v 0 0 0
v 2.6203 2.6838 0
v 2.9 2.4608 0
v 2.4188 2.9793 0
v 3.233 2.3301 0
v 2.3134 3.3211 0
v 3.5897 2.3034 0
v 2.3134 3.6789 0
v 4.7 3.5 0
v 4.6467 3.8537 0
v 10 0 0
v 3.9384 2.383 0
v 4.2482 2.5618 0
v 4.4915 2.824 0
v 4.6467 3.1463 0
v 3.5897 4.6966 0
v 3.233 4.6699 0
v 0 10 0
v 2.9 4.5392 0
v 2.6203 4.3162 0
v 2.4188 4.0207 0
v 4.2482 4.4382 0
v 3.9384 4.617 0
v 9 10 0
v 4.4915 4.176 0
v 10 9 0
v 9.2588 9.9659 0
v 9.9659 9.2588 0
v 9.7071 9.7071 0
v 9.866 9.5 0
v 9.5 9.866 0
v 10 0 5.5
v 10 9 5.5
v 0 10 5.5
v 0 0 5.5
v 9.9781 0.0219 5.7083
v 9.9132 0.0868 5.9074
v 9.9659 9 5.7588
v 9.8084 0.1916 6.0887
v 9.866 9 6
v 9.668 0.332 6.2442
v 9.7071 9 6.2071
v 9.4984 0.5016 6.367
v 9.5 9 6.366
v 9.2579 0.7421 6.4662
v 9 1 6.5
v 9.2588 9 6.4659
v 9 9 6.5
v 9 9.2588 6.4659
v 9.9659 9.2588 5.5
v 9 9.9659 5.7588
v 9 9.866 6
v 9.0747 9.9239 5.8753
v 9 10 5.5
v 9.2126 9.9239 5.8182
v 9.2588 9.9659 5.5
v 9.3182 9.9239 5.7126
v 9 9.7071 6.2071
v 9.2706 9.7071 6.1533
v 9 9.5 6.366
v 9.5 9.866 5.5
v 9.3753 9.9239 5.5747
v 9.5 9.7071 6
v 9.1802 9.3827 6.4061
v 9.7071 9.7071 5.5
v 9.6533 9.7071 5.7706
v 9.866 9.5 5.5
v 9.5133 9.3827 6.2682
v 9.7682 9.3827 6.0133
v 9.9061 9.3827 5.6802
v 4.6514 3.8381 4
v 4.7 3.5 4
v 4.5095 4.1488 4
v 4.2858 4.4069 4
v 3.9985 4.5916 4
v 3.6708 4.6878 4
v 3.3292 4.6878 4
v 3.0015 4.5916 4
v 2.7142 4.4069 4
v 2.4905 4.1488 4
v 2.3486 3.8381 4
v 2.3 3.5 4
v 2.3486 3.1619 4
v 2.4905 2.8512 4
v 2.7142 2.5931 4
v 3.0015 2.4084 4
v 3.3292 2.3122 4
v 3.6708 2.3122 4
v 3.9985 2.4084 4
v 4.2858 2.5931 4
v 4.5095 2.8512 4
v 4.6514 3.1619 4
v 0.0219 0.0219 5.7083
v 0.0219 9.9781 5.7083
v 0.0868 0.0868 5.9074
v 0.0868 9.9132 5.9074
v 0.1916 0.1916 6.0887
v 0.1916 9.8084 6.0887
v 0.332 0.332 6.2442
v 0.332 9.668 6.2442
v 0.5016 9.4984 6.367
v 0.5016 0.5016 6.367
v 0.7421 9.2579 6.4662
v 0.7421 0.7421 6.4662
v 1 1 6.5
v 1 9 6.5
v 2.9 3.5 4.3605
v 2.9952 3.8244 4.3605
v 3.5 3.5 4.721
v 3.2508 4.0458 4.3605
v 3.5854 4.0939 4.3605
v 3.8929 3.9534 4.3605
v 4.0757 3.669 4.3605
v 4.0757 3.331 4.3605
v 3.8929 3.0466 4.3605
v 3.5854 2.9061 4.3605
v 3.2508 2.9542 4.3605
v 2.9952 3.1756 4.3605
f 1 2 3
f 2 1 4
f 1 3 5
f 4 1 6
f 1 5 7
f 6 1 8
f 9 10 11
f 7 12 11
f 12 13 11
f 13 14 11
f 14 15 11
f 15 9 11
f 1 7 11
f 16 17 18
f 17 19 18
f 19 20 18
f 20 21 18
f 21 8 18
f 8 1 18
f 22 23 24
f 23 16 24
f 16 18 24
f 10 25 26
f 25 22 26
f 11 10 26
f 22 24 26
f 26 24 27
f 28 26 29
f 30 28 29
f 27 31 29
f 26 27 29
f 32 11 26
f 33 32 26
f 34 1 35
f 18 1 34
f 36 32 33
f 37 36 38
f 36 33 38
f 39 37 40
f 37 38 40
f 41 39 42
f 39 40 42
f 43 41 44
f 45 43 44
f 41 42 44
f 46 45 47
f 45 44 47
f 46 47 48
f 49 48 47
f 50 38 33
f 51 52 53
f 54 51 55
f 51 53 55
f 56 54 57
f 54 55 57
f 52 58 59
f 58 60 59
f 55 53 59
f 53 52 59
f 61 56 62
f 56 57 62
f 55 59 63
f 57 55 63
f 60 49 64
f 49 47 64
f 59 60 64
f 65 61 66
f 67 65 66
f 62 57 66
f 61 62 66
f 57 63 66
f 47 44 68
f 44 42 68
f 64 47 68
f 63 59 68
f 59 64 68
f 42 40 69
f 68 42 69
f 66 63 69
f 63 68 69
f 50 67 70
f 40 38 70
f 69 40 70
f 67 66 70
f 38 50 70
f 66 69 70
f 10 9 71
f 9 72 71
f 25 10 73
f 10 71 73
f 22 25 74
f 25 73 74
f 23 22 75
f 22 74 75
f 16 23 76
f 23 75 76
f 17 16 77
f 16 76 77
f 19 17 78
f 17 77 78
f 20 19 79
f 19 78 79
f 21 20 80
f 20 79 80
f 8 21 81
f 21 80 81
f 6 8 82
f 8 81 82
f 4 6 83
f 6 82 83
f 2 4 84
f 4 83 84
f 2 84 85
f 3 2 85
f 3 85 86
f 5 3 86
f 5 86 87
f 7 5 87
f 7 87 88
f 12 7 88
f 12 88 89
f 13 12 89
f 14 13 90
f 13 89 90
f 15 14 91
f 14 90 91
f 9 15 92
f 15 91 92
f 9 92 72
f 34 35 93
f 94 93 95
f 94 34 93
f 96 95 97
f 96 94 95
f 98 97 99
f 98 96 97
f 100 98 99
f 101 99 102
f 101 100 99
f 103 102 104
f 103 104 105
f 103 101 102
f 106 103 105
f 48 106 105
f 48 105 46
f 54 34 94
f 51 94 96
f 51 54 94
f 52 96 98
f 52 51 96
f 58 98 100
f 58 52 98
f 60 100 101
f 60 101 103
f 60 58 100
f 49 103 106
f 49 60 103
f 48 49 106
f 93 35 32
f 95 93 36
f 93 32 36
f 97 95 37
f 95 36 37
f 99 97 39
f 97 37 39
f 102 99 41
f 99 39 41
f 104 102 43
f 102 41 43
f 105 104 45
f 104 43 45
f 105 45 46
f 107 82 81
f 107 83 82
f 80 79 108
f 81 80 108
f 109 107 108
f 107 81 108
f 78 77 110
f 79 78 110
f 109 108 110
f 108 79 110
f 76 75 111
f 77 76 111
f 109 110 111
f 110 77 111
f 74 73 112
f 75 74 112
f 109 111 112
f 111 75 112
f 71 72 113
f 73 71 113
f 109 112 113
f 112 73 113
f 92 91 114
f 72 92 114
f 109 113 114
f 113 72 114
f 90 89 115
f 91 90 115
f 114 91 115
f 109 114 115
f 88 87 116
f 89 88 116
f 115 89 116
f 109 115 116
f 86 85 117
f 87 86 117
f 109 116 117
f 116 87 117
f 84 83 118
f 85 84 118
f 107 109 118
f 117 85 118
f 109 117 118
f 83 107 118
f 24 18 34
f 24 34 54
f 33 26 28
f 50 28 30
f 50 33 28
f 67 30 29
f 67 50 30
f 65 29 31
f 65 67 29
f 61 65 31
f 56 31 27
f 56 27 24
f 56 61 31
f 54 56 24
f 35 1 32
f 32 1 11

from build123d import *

# Parameters (mm, degrees)
SKETCH1_W                = 10
SKETCH1_H                = 10
BOSS_EXTRUDE1_DEPTH      = 6.5
FILLET1_R                = 1
M2_CLEARANCE_HOLE1_D     = 2.4
M2_CLEARANCE_HOLE1_DEPTH = 4
M2_CLEARANCE_HOLE1_TIP   = 0.721032743


with BuildPart() as part:
    # Sketch1 → Boss-Extrude1 (new body)
    with BuildSketch(Plane.XY):
        with Locations((5, 5)):
            Rectangle(SKETCH1_W, SKETCH1_H)
    extrude(amount=BOSS_EXTRUDE1_DEPTH)

    # Fillet1
    fillet1_edges = [part.edges().sort_by_distance(p)[0] for p in [
        (10, 5, 6.5),
        (5, 10, 6.5),
        (0, 5, 6.5),
        (5, 0, 6.5),
        (10, 10, 3.25),
    ]]
    fillet(fillet1_edges, radius=FILLET1_R)

    # M2 Clearance Hole1
    with Locations(Plane(origin=(0, 0, 0), x_dir=(-1, 0, 0), z_dir=(0, 0, -1))):
        with Locations((-3.5, 3.5)):
            Hole(M2_CLEARANCE_HOLE1_D / 2, depth=M2_CLEARANCE_HOLE1_DEPTH)
            with Locations((0, 0, -(M2_CLEARANCE_HOLE1_DEPTH + M2_CLEARANCE_HOLE1_TIP / 2))):  # 118° drill point
                Cone(0, M2_CLEARANCE_HOLE1_D / 2, M2_CLEARANCE_HOLE1_TIP, mode=Mode.SUBTRACT)


solid = part.part
